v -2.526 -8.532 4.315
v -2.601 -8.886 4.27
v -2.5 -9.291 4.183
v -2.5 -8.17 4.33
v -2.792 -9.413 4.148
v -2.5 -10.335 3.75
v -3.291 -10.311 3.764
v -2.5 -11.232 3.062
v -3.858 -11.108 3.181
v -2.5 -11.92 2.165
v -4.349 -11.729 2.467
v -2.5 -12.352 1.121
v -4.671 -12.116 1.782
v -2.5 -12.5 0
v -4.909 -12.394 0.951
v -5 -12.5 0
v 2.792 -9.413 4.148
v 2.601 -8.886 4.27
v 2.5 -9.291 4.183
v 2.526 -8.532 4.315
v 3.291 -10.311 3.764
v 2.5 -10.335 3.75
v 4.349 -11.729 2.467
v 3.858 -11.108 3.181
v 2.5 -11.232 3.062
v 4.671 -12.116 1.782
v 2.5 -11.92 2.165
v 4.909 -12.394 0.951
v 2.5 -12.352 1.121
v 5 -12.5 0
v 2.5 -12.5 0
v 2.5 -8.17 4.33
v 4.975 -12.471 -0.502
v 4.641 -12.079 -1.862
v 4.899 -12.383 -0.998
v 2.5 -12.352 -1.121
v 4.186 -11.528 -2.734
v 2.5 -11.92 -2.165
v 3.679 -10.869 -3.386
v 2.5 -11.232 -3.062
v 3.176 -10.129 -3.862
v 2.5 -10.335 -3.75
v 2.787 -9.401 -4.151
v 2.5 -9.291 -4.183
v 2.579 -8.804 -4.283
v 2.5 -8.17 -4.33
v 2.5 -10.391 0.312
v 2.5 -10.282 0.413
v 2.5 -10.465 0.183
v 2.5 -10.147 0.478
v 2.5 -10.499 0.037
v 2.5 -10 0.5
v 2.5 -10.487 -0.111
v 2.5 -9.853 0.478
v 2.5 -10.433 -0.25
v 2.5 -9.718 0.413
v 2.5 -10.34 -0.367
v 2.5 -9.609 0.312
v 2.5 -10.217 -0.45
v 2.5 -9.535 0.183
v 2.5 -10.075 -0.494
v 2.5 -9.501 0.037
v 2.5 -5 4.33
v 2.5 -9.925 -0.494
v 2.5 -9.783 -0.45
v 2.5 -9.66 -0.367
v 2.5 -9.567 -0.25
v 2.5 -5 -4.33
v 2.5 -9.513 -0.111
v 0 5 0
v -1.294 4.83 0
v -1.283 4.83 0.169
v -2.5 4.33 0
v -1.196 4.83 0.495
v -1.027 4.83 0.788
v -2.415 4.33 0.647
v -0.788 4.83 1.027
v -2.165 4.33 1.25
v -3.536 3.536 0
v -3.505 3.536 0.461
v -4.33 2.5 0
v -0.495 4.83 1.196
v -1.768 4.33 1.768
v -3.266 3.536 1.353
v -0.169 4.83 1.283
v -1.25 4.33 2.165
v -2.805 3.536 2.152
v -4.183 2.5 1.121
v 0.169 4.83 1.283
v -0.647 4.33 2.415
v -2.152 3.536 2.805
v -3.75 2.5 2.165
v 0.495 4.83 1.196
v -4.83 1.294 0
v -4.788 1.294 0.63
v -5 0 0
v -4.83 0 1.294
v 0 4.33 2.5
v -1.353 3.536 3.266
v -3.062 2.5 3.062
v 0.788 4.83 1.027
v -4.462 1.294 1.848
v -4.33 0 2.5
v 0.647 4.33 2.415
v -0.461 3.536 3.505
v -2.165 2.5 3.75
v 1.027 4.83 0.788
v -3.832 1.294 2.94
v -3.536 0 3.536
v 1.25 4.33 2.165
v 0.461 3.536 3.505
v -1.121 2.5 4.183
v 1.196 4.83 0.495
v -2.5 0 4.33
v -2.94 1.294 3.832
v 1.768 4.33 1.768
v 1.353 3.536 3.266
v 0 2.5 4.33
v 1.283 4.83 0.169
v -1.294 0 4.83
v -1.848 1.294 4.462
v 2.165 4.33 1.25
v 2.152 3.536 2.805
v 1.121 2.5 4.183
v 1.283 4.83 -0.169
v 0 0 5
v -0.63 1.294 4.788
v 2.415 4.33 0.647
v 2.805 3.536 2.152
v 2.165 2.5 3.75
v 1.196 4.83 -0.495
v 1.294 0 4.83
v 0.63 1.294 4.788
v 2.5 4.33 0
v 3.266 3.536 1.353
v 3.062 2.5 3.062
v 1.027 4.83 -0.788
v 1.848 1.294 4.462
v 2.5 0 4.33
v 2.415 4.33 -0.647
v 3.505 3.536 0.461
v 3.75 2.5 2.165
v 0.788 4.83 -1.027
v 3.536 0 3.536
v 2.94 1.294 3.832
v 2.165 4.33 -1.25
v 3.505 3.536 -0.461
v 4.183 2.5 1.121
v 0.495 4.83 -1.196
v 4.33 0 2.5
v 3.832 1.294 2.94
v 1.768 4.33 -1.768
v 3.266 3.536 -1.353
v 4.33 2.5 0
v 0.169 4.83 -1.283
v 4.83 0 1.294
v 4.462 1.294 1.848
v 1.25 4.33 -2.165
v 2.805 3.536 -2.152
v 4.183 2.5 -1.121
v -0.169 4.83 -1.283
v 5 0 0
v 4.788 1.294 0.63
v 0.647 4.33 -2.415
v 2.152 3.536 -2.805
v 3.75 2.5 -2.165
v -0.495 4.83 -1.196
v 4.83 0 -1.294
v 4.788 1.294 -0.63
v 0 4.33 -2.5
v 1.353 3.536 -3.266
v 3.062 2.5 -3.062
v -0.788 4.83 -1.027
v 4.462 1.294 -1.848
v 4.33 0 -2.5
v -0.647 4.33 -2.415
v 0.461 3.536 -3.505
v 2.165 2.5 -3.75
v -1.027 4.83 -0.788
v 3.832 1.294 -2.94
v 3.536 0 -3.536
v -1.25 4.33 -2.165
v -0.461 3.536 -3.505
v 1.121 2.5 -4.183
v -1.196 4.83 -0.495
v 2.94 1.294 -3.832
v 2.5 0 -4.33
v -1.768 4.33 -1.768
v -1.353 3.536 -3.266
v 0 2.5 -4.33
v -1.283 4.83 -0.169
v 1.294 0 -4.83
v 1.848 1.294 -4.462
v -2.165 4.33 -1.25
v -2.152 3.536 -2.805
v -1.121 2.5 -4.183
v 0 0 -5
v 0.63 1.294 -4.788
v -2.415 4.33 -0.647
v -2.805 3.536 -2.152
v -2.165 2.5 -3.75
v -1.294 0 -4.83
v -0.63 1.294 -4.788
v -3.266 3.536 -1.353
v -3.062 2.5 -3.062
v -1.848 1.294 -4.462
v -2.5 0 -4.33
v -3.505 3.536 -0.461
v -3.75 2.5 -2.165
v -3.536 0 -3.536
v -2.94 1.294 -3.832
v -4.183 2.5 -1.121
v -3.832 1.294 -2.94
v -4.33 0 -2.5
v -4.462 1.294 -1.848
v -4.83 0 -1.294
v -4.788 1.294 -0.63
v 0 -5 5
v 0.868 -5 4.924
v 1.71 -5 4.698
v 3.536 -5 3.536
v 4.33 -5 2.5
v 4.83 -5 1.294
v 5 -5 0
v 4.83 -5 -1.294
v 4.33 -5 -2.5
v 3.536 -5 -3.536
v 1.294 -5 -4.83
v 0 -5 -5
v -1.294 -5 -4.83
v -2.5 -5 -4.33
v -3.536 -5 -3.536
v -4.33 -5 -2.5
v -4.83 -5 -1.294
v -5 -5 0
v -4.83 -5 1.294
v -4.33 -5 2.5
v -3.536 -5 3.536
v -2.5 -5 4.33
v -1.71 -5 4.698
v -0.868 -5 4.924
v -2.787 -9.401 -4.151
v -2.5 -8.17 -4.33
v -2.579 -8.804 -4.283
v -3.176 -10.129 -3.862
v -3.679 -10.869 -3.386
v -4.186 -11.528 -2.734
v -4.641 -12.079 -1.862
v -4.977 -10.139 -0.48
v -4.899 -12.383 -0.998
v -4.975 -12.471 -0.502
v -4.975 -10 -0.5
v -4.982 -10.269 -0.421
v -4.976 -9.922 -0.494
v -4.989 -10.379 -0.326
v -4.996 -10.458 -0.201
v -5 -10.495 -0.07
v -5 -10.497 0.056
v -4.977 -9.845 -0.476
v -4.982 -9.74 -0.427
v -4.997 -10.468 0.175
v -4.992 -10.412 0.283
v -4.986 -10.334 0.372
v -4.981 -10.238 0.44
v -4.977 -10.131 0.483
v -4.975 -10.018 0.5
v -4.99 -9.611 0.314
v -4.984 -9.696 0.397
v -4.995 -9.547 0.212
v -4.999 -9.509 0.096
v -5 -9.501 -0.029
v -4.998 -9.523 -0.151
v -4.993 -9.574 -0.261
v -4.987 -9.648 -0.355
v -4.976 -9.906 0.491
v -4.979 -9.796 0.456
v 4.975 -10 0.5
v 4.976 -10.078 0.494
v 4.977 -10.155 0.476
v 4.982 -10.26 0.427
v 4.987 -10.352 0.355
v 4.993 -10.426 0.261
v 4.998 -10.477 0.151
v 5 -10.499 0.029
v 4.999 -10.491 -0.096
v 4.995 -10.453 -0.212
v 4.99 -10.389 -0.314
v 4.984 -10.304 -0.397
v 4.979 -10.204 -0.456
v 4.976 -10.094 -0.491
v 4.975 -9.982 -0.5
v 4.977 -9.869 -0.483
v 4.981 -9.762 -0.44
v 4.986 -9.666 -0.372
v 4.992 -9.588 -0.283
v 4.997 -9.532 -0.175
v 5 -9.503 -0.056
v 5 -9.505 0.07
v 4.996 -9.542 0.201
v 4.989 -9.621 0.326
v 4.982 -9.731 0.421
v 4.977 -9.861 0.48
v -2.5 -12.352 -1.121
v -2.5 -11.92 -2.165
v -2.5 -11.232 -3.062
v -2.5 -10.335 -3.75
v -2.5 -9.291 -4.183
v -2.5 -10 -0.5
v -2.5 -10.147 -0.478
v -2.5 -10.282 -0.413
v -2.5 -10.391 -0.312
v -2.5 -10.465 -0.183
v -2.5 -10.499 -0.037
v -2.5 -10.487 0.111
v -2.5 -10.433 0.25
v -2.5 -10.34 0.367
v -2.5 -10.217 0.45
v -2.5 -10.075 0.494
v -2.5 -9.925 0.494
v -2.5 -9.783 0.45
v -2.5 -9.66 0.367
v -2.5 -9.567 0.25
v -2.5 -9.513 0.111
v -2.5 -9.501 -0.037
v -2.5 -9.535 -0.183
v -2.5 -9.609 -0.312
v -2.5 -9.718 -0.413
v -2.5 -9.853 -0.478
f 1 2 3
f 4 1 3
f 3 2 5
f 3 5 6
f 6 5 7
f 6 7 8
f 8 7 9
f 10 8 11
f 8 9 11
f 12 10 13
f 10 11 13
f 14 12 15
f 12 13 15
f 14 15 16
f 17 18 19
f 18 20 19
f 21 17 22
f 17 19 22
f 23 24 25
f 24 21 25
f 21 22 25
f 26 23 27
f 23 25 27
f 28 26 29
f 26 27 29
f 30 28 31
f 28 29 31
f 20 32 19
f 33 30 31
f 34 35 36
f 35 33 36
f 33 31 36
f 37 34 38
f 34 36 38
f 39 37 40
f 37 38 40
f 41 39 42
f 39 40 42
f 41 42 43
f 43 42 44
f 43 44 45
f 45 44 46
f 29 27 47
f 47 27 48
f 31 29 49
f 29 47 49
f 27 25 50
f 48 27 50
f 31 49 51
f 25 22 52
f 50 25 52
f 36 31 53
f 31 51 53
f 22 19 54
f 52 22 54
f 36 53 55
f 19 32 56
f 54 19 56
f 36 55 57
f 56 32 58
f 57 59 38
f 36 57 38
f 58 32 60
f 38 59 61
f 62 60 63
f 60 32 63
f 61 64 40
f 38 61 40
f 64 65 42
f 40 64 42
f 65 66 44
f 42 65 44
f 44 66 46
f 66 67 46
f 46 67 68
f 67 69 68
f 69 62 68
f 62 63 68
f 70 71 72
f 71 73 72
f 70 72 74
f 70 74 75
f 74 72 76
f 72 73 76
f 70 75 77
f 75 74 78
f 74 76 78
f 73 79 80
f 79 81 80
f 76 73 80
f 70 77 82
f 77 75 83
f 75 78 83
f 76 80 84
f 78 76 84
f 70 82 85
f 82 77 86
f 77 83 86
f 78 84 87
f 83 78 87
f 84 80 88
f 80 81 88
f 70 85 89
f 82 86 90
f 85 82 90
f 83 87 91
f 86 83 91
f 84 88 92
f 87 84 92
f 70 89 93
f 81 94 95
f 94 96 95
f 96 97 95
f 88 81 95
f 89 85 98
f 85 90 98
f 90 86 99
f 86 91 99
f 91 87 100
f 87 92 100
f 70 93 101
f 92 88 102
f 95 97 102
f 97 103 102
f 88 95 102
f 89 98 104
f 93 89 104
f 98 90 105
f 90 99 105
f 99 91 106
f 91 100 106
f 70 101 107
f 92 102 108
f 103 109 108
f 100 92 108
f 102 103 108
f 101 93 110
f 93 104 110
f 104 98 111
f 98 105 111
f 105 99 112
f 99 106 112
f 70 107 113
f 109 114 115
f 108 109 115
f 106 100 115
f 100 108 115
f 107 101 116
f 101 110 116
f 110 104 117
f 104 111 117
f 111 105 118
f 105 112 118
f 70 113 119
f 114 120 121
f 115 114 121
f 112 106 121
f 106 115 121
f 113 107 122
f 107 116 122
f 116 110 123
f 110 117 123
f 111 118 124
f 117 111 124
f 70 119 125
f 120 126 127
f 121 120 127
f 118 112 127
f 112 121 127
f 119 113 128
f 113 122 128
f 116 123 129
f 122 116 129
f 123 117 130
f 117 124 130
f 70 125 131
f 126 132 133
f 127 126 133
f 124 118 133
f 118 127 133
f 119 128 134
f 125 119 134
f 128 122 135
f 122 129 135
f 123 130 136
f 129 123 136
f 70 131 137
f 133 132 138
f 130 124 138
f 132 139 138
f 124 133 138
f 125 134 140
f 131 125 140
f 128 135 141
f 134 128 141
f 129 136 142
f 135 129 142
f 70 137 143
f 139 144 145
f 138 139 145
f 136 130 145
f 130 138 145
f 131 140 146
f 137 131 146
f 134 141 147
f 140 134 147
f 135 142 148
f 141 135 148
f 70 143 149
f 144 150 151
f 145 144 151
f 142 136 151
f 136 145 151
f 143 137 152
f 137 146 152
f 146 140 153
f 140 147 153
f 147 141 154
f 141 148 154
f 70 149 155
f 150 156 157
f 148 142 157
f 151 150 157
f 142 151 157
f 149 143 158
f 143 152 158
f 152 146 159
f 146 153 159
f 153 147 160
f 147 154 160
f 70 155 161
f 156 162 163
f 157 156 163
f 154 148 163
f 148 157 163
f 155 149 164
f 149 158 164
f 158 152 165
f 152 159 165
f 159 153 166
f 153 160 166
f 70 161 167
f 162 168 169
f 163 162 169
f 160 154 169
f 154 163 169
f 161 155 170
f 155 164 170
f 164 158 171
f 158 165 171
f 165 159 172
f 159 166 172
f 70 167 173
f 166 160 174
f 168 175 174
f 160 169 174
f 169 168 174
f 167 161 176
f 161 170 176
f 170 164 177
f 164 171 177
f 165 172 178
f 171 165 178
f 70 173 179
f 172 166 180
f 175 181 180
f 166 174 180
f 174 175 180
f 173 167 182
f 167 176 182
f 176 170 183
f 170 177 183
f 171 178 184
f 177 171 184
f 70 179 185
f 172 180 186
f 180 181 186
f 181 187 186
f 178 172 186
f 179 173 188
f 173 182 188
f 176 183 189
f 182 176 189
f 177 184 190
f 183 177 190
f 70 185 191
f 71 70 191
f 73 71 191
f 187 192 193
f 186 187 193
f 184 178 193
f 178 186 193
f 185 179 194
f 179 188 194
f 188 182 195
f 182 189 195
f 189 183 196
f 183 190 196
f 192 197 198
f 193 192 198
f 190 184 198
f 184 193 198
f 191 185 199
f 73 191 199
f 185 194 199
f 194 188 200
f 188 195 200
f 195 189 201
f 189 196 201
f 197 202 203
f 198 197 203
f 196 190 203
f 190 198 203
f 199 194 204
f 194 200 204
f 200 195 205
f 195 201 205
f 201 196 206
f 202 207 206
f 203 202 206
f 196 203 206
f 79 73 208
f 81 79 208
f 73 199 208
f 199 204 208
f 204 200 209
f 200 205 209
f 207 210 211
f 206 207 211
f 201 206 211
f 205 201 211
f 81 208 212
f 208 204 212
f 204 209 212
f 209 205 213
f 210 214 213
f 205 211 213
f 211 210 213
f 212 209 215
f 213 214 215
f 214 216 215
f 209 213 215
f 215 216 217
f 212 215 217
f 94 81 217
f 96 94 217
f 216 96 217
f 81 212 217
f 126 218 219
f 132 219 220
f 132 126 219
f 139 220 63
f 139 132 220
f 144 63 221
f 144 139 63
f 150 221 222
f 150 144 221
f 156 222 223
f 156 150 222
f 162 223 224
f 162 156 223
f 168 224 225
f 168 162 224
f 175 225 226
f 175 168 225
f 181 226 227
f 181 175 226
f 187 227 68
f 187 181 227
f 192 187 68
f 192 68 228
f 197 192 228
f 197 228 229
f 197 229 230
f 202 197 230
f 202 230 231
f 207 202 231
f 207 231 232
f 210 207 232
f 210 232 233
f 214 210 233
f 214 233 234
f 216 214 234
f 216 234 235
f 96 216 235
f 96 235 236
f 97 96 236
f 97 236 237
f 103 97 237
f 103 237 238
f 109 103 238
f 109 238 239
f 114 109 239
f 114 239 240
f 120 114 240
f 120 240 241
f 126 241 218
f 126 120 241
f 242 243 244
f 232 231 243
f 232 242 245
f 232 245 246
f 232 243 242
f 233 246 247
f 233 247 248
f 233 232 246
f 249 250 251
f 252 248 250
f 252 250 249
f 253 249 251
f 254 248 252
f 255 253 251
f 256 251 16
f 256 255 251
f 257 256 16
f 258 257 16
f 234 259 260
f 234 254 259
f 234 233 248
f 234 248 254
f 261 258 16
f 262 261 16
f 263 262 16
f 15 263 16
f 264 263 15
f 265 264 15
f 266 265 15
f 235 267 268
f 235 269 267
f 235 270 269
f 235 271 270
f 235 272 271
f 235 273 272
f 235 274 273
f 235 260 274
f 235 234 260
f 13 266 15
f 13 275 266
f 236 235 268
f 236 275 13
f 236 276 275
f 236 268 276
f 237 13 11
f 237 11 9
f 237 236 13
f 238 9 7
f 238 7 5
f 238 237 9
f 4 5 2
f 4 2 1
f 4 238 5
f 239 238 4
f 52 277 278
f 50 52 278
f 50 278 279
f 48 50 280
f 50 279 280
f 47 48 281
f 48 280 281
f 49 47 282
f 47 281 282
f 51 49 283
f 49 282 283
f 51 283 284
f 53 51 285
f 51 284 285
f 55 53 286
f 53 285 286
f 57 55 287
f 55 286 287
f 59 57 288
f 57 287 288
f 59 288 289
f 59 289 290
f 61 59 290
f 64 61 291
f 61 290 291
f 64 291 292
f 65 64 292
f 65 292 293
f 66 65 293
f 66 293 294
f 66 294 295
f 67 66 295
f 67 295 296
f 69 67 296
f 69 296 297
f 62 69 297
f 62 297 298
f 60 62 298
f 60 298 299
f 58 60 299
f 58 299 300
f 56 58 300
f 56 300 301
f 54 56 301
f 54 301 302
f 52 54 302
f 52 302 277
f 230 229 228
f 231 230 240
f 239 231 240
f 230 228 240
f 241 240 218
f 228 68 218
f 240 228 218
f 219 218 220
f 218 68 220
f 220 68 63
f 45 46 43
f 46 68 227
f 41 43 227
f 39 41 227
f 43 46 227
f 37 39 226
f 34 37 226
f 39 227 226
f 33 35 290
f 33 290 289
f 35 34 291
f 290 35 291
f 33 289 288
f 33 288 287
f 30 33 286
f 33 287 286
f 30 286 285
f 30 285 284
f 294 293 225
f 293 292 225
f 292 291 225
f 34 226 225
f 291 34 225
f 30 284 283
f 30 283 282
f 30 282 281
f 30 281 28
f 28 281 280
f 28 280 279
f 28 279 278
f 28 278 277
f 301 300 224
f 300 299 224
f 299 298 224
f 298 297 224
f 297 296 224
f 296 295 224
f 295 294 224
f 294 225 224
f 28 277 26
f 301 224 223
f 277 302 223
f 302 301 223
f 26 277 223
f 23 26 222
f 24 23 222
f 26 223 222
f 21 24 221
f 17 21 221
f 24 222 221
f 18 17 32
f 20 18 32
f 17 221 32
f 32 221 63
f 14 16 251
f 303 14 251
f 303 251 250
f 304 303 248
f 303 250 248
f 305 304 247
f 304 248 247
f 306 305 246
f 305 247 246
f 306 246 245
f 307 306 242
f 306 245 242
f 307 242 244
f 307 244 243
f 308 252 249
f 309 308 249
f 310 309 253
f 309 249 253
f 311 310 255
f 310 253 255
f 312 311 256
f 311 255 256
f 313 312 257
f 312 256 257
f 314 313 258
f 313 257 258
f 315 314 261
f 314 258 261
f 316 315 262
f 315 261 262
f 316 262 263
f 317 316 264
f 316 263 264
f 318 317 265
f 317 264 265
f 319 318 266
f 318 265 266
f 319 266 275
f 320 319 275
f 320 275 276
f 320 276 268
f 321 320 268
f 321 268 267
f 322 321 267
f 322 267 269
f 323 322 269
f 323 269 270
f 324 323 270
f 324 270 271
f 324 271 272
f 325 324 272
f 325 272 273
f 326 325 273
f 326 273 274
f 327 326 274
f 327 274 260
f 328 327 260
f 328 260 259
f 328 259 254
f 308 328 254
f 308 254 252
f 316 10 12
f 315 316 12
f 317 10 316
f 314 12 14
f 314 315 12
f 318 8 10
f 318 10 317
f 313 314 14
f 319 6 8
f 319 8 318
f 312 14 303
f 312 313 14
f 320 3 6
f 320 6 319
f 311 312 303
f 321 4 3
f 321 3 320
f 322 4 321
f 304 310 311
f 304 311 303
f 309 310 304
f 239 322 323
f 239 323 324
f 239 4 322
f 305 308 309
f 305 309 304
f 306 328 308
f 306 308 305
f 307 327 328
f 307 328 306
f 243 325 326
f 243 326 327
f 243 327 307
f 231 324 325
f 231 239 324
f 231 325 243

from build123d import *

# Parameters (mm, degrees)
SKETCH1_R                            = 5
BOSS_EXTRUDE1_DEPTH                  = 5
BOSS_EXTRUDE3_DEPTH                  = 7.5
CUT_EXTRUDE3_DEPTH                   = 7.5
CUT_EXTRUDE3_DEPTH_BACK              = 7.5
F_95_0_03937008_DIAMETER_HOLE1_D     = 1.000000032
F_95_0_03937008_DIAMETER_HOLE1_DEPTH = 2.5
F_94_0_03937008_DIAMETER_HOLE1_D     = 1.000000032


with BuildPart() as part:
    # Sketch1 → Boss-Extrude1 (new body)
    with BuildSketch(Plane(origin=(0, 0, 0), x_dir=(1, 0, 0), z_dir=(0, 1, 0))):
        with Locations(Location((0, 0, 0), (0, 0, 270))):
            Circle(SKETCH1_R)
    extrude(amount=-BOSS_EXTRUDE1_DEPTH)

    # Sketch2 → Boss-Extrude3 (add)
    with BuildSketch(Plane.XZ.offset(5)):
        with BuildLine():
            Line((-2.5, 4.330127019), (-2.5, -4.330127019))
            ThreePointArc((-2.5, -4.330127019), (-5, 0), (-2.5, 4.330127019))
        make_face()
        with BuildLine():
            Line((2.5, 4.330127019), (2.5, -4.330127019))
            ThreePointArc((2.5, -4.330127019), (5, 0), (2.5, 4.330127019))
        make_face()
    extrude(amount=BOSS_EXTRUDE3_DEPTH)

    # Sketch3 → Cut-Extrude3 (cut, two sides: drawn at the far end of the back side and taken through both)
    with BuildSketch(Plane(origin=(-2.5, 0, 0), x_dir=(0, 0, -1), z_dir=(1, 0, 0)).offset(-CUT_EXTRUDE3_DEPTH_BACK)):
        with BuildLine():
            Line((4.330127019, -8.16987298), (5.6827841, -8.16987298))
            Line((5.6827841, -8.16987298), (5.6827841, -17.335433659))
            Line((5.6827841, -17.335433659), (-5.198770312, -17.335433659))
            Line((-5.198770312, -17.335433659), (-5.198770312, -8.16987298))
            Line((-5.198770312, -8.16987298), (-4.330127019, -8.16987298))
            ThreePointArc((-4.330127019, -8.16987298), (-3.061862179, -11.231735159), (0, -12.5))
            ThreePointArc((0, -12.5), (3.061862179, -11.231735159), (4.330127019, -8.16987298))
        make_face()
    extrude(amount=CUT_EXTRUDE3_DEPTH + CUT_EXTRUDE3_DEPTH_BACK, mode=Mode.SUBTRACT)

    # #95 (0.03937008) Diameter Hole1
    with Locations(Plane(origin=(2.5, -10, 0), x_dir=(0, 0, -1), z_dir=(-1, 0, 0))):
        with Locations((0, 0)):
            Hole(F_95_0_03937008_DIAMETER_HOLE1_D / 2, depth=F_95_0_03937008_DIAMETER_HOLE1_DEPTH)

    # #94 (0.03937008) Diameter Hole1 (through all)
    with Locations(Plane(origin=(2.5, -10, 0), x_dir=(0, 0, 1), z_dir=(1, 0, 0))):
        with Locations((0, 0)):
            Hole(F_94_0_03937008_DIAMETER_HOLE1_D / 2)

    # Sketch7 → Revolve1 (revolve)
    with BuildSketch(Plane.XY):
        with BuildLine():
            Line((0, 0), (0, 5))
            ThreePointArc((0, 5), (-3.535533906, 3.535533906), (-5, 0))
            Line((-5, 0), (0, 0))
        make_face()
    revolve(axis=Axis((0, 0, 0), (0, 1, 0)))


solid = part.part
